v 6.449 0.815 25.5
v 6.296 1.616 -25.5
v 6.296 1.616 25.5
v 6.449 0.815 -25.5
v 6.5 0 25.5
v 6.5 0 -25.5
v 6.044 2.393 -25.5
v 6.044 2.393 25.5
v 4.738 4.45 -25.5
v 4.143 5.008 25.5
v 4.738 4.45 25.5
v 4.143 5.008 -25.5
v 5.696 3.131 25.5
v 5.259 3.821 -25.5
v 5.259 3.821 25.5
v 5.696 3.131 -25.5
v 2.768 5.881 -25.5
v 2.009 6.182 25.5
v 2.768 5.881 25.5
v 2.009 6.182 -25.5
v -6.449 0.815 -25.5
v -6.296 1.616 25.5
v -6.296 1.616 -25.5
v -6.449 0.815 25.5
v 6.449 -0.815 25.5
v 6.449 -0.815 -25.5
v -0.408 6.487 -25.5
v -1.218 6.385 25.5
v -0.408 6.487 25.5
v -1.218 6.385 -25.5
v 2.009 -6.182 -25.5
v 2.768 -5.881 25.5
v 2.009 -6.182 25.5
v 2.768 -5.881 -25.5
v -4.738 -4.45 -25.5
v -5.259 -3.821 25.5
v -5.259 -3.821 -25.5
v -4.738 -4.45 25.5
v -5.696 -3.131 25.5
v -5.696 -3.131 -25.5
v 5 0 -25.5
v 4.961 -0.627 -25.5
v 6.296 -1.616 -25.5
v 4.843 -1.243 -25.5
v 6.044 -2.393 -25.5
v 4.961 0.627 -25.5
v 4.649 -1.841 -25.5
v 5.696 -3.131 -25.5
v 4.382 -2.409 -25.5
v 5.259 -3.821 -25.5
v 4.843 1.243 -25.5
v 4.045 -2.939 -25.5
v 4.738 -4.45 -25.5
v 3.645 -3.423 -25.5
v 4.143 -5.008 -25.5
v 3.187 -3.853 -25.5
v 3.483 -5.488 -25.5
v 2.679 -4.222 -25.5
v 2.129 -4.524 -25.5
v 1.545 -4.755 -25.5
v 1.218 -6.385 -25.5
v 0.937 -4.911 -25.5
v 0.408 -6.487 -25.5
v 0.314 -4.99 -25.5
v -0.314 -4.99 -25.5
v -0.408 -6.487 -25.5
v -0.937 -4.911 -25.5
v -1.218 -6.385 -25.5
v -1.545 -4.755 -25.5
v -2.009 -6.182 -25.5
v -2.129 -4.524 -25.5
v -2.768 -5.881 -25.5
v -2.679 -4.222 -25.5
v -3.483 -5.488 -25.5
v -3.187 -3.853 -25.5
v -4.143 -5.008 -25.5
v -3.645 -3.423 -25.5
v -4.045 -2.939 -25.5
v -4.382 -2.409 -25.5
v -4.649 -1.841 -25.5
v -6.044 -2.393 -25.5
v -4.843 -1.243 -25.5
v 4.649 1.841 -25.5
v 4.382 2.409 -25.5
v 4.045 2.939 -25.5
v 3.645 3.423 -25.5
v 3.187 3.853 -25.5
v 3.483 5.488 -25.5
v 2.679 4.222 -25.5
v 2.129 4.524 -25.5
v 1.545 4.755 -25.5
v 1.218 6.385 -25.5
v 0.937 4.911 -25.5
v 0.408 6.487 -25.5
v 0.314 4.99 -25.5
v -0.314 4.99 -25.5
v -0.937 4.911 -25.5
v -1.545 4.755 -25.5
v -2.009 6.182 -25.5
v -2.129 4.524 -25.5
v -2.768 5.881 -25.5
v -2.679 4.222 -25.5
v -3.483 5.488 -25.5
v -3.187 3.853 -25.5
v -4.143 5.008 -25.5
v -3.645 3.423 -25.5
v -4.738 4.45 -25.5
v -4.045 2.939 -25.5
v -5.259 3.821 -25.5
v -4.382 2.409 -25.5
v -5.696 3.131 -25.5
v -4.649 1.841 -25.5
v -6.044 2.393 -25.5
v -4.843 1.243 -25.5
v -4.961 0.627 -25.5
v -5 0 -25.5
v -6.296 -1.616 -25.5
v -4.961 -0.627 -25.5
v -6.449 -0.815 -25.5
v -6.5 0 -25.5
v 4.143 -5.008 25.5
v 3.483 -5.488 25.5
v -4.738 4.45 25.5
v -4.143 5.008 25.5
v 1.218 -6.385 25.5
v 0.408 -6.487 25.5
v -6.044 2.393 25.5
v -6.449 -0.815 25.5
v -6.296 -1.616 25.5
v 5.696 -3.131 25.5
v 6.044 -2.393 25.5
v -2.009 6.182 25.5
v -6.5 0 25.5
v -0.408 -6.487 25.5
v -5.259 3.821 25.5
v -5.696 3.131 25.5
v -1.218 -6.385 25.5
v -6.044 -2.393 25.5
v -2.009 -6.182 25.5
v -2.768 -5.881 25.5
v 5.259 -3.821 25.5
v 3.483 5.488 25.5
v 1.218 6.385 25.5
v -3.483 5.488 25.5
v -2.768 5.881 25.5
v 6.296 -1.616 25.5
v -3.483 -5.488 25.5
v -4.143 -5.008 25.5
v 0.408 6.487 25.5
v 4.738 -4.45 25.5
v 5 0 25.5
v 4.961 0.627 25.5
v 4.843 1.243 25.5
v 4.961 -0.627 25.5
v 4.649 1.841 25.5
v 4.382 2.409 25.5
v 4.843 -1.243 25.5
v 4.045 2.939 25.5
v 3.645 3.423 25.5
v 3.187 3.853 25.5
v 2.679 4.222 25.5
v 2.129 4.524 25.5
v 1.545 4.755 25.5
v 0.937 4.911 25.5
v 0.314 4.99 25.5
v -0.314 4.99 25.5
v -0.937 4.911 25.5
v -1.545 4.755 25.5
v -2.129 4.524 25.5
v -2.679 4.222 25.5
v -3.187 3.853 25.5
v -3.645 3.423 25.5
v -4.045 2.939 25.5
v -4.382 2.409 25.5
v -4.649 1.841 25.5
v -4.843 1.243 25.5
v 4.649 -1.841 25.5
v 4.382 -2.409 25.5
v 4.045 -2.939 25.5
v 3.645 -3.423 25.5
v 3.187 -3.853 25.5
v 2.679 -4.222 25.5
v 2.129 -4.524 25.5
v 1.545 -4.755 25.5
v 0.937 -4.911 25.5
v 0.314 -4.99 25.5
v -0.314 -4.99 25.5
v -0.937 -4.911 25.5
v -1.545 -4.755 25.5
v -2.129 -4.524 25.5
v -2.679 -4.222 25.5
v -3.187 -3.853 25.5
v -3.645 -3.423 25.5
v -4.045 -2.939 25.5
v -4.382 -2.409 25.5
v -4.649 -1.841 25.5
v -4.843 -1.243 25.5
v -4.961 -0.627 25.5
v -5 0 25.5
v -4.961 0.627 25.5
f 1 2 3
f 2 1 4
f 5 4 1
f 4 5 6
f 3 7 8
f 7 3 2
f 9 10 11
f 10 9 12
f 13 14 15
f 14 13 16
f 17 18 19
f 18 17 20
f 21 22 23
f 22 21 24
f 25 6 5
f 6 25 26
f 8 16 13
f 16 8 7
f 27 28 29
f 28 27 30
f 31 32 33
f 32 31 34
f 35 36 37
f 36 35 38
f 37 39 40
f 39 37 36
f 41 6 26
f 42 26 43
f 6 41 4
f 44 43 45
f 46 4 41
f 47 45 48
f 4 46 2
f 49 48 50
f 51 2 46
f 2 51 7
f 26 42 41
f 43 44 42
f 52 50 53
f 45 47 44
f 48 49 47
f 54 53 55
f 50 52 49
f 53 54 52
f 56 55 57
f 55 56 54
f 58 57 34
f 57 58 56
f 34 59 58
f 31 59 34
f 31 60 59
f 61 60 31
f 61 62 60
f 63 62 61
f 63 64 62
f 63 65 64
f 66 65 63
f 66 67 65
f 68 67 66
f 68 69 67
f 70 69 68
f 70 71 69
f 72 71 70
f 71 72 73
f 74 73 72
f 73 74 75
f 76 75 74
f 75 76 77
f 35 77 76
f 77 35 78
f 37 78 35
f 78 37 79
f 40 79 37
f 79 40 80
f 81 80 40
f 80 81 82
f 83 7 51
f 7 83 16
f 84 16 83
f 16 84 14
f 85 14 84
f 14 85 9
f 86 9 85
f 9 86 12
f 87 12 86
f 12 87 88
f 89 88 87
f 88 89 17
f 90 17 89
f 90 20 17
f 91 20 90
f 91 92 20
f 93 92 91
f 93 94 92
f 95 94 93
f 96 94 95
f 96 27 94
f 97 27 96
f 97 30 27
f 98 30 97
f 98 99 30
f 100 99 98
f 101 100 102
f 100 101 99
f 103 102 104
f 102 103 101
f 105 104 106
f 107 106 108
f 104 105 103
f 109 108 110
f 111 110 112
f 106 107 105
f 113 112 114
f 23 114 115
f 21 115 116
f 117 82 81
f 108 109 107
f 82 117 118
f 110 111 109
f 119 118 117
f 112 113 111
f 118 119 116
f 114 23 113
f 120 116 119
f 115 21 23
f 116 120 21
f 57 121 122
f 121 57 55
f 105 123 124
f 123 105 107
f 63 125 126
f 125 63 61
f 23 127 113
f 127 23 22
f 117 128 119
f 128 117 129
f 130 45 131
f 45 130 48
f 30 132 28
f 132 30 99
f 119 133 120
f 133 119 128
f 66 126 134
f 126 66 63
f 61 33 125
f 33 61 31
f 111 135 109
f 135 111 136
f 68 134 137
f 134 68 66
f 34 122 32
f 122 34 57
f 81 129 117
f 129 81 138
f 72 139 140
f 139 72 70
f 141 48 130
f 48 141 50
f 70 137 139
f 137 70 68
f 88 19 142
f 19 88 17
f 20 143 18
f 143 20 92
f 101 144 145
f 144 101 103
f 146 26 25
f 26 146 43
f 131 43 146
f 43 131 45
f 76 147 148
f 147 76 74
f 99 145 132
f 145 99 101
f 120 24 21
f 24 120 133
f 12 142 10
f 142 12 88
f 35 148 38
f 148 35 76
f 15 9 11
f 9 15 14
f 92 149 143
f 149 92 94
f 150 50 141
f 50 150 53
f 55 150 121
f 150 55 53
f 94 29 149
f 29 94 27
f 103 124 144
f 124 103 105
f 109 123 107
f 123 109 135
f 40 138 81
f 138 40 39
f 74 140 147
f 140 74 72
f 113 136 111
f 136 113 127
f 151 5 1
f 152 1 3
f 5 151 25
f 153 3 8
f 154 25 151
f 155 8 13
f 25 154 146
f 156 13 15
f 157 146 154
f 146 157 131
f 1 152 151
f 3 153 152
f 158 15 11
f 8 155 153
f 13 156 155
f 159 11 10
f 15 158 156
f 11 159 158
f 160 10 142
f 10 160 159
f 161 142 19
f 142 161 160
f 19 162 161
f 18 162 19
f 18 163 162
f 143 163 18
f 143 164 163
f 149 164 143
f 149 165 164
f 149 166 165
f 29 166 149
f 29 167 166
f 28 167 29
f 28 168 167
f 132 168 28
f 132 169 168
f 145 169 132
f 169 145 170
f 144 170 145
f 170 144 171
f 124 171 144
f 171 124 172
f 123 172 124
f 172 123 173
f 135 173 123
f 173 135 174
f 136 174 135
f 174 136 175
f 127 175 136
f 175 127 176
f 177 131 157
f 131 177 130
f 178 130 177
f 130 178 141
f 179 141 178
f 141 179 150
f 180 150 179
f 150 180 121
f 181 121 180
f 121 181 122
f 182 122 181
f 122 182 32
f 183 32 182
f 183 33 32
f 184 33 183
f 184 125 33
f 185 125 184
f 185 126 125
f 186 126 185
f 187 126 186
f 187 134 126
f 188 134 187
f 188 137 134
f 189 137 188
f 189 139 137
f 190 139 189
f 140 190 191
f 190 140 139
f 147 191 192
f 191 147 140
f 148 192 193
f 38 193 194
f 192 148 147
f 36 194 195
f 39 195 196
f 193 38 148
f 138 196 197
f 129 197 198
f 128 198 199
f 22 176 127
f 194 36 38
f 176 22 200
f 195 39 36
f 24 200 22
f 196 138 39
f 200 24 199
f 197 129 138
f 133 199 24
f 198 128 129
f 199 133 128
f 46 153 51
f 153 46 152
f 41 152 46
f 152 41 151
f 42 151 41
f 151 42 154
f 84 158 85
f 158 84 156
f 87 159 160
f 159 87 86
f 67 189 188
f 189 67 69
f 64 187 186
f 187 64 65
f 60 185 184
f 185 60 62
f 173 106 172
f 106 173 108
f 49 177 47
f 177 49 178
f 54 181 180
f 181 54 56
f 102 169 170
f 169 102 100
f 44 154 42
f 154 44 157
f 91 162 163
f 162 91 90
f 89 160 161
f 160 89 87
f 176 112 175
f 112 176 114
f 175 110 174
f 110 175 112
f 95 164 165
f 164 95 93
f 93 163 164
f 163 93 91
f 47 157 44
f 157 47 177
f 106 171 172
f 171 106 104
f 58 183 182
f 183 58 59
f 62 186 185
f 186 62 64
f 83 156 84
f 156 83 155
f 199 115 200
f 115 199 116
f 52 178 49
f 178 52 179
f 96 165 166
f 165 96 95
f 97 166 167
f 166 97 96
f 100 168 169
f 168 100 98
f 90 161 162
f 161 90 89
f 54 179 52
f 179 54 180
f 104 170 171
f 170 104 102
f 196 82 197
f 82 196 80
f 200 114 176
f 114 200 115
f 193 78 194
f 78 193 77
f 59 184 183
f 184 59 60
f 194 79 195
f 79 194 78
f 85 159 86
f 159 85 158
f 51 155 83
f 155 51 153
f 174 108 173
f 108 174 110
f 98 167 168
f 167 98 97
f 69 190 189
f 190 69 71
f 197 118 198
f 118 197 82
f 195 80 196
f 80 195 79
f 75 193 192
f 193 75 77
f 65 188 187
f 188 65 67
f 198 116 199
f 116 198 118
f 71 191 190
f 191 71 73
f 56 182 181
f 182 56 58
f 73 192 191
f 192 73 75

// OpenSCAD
$fn = 50;


difference() {
	union() {
		translate(v = [0, 0, -25.5000000000]) {
			cylinder(h = 51, r = 6.5000000000);
		}
	}
	union() {
		translate(v = [0, 0, -100.0000000000]) {
			cylinder(h = 200, r = 5.0000000000);
		}
	}
}
